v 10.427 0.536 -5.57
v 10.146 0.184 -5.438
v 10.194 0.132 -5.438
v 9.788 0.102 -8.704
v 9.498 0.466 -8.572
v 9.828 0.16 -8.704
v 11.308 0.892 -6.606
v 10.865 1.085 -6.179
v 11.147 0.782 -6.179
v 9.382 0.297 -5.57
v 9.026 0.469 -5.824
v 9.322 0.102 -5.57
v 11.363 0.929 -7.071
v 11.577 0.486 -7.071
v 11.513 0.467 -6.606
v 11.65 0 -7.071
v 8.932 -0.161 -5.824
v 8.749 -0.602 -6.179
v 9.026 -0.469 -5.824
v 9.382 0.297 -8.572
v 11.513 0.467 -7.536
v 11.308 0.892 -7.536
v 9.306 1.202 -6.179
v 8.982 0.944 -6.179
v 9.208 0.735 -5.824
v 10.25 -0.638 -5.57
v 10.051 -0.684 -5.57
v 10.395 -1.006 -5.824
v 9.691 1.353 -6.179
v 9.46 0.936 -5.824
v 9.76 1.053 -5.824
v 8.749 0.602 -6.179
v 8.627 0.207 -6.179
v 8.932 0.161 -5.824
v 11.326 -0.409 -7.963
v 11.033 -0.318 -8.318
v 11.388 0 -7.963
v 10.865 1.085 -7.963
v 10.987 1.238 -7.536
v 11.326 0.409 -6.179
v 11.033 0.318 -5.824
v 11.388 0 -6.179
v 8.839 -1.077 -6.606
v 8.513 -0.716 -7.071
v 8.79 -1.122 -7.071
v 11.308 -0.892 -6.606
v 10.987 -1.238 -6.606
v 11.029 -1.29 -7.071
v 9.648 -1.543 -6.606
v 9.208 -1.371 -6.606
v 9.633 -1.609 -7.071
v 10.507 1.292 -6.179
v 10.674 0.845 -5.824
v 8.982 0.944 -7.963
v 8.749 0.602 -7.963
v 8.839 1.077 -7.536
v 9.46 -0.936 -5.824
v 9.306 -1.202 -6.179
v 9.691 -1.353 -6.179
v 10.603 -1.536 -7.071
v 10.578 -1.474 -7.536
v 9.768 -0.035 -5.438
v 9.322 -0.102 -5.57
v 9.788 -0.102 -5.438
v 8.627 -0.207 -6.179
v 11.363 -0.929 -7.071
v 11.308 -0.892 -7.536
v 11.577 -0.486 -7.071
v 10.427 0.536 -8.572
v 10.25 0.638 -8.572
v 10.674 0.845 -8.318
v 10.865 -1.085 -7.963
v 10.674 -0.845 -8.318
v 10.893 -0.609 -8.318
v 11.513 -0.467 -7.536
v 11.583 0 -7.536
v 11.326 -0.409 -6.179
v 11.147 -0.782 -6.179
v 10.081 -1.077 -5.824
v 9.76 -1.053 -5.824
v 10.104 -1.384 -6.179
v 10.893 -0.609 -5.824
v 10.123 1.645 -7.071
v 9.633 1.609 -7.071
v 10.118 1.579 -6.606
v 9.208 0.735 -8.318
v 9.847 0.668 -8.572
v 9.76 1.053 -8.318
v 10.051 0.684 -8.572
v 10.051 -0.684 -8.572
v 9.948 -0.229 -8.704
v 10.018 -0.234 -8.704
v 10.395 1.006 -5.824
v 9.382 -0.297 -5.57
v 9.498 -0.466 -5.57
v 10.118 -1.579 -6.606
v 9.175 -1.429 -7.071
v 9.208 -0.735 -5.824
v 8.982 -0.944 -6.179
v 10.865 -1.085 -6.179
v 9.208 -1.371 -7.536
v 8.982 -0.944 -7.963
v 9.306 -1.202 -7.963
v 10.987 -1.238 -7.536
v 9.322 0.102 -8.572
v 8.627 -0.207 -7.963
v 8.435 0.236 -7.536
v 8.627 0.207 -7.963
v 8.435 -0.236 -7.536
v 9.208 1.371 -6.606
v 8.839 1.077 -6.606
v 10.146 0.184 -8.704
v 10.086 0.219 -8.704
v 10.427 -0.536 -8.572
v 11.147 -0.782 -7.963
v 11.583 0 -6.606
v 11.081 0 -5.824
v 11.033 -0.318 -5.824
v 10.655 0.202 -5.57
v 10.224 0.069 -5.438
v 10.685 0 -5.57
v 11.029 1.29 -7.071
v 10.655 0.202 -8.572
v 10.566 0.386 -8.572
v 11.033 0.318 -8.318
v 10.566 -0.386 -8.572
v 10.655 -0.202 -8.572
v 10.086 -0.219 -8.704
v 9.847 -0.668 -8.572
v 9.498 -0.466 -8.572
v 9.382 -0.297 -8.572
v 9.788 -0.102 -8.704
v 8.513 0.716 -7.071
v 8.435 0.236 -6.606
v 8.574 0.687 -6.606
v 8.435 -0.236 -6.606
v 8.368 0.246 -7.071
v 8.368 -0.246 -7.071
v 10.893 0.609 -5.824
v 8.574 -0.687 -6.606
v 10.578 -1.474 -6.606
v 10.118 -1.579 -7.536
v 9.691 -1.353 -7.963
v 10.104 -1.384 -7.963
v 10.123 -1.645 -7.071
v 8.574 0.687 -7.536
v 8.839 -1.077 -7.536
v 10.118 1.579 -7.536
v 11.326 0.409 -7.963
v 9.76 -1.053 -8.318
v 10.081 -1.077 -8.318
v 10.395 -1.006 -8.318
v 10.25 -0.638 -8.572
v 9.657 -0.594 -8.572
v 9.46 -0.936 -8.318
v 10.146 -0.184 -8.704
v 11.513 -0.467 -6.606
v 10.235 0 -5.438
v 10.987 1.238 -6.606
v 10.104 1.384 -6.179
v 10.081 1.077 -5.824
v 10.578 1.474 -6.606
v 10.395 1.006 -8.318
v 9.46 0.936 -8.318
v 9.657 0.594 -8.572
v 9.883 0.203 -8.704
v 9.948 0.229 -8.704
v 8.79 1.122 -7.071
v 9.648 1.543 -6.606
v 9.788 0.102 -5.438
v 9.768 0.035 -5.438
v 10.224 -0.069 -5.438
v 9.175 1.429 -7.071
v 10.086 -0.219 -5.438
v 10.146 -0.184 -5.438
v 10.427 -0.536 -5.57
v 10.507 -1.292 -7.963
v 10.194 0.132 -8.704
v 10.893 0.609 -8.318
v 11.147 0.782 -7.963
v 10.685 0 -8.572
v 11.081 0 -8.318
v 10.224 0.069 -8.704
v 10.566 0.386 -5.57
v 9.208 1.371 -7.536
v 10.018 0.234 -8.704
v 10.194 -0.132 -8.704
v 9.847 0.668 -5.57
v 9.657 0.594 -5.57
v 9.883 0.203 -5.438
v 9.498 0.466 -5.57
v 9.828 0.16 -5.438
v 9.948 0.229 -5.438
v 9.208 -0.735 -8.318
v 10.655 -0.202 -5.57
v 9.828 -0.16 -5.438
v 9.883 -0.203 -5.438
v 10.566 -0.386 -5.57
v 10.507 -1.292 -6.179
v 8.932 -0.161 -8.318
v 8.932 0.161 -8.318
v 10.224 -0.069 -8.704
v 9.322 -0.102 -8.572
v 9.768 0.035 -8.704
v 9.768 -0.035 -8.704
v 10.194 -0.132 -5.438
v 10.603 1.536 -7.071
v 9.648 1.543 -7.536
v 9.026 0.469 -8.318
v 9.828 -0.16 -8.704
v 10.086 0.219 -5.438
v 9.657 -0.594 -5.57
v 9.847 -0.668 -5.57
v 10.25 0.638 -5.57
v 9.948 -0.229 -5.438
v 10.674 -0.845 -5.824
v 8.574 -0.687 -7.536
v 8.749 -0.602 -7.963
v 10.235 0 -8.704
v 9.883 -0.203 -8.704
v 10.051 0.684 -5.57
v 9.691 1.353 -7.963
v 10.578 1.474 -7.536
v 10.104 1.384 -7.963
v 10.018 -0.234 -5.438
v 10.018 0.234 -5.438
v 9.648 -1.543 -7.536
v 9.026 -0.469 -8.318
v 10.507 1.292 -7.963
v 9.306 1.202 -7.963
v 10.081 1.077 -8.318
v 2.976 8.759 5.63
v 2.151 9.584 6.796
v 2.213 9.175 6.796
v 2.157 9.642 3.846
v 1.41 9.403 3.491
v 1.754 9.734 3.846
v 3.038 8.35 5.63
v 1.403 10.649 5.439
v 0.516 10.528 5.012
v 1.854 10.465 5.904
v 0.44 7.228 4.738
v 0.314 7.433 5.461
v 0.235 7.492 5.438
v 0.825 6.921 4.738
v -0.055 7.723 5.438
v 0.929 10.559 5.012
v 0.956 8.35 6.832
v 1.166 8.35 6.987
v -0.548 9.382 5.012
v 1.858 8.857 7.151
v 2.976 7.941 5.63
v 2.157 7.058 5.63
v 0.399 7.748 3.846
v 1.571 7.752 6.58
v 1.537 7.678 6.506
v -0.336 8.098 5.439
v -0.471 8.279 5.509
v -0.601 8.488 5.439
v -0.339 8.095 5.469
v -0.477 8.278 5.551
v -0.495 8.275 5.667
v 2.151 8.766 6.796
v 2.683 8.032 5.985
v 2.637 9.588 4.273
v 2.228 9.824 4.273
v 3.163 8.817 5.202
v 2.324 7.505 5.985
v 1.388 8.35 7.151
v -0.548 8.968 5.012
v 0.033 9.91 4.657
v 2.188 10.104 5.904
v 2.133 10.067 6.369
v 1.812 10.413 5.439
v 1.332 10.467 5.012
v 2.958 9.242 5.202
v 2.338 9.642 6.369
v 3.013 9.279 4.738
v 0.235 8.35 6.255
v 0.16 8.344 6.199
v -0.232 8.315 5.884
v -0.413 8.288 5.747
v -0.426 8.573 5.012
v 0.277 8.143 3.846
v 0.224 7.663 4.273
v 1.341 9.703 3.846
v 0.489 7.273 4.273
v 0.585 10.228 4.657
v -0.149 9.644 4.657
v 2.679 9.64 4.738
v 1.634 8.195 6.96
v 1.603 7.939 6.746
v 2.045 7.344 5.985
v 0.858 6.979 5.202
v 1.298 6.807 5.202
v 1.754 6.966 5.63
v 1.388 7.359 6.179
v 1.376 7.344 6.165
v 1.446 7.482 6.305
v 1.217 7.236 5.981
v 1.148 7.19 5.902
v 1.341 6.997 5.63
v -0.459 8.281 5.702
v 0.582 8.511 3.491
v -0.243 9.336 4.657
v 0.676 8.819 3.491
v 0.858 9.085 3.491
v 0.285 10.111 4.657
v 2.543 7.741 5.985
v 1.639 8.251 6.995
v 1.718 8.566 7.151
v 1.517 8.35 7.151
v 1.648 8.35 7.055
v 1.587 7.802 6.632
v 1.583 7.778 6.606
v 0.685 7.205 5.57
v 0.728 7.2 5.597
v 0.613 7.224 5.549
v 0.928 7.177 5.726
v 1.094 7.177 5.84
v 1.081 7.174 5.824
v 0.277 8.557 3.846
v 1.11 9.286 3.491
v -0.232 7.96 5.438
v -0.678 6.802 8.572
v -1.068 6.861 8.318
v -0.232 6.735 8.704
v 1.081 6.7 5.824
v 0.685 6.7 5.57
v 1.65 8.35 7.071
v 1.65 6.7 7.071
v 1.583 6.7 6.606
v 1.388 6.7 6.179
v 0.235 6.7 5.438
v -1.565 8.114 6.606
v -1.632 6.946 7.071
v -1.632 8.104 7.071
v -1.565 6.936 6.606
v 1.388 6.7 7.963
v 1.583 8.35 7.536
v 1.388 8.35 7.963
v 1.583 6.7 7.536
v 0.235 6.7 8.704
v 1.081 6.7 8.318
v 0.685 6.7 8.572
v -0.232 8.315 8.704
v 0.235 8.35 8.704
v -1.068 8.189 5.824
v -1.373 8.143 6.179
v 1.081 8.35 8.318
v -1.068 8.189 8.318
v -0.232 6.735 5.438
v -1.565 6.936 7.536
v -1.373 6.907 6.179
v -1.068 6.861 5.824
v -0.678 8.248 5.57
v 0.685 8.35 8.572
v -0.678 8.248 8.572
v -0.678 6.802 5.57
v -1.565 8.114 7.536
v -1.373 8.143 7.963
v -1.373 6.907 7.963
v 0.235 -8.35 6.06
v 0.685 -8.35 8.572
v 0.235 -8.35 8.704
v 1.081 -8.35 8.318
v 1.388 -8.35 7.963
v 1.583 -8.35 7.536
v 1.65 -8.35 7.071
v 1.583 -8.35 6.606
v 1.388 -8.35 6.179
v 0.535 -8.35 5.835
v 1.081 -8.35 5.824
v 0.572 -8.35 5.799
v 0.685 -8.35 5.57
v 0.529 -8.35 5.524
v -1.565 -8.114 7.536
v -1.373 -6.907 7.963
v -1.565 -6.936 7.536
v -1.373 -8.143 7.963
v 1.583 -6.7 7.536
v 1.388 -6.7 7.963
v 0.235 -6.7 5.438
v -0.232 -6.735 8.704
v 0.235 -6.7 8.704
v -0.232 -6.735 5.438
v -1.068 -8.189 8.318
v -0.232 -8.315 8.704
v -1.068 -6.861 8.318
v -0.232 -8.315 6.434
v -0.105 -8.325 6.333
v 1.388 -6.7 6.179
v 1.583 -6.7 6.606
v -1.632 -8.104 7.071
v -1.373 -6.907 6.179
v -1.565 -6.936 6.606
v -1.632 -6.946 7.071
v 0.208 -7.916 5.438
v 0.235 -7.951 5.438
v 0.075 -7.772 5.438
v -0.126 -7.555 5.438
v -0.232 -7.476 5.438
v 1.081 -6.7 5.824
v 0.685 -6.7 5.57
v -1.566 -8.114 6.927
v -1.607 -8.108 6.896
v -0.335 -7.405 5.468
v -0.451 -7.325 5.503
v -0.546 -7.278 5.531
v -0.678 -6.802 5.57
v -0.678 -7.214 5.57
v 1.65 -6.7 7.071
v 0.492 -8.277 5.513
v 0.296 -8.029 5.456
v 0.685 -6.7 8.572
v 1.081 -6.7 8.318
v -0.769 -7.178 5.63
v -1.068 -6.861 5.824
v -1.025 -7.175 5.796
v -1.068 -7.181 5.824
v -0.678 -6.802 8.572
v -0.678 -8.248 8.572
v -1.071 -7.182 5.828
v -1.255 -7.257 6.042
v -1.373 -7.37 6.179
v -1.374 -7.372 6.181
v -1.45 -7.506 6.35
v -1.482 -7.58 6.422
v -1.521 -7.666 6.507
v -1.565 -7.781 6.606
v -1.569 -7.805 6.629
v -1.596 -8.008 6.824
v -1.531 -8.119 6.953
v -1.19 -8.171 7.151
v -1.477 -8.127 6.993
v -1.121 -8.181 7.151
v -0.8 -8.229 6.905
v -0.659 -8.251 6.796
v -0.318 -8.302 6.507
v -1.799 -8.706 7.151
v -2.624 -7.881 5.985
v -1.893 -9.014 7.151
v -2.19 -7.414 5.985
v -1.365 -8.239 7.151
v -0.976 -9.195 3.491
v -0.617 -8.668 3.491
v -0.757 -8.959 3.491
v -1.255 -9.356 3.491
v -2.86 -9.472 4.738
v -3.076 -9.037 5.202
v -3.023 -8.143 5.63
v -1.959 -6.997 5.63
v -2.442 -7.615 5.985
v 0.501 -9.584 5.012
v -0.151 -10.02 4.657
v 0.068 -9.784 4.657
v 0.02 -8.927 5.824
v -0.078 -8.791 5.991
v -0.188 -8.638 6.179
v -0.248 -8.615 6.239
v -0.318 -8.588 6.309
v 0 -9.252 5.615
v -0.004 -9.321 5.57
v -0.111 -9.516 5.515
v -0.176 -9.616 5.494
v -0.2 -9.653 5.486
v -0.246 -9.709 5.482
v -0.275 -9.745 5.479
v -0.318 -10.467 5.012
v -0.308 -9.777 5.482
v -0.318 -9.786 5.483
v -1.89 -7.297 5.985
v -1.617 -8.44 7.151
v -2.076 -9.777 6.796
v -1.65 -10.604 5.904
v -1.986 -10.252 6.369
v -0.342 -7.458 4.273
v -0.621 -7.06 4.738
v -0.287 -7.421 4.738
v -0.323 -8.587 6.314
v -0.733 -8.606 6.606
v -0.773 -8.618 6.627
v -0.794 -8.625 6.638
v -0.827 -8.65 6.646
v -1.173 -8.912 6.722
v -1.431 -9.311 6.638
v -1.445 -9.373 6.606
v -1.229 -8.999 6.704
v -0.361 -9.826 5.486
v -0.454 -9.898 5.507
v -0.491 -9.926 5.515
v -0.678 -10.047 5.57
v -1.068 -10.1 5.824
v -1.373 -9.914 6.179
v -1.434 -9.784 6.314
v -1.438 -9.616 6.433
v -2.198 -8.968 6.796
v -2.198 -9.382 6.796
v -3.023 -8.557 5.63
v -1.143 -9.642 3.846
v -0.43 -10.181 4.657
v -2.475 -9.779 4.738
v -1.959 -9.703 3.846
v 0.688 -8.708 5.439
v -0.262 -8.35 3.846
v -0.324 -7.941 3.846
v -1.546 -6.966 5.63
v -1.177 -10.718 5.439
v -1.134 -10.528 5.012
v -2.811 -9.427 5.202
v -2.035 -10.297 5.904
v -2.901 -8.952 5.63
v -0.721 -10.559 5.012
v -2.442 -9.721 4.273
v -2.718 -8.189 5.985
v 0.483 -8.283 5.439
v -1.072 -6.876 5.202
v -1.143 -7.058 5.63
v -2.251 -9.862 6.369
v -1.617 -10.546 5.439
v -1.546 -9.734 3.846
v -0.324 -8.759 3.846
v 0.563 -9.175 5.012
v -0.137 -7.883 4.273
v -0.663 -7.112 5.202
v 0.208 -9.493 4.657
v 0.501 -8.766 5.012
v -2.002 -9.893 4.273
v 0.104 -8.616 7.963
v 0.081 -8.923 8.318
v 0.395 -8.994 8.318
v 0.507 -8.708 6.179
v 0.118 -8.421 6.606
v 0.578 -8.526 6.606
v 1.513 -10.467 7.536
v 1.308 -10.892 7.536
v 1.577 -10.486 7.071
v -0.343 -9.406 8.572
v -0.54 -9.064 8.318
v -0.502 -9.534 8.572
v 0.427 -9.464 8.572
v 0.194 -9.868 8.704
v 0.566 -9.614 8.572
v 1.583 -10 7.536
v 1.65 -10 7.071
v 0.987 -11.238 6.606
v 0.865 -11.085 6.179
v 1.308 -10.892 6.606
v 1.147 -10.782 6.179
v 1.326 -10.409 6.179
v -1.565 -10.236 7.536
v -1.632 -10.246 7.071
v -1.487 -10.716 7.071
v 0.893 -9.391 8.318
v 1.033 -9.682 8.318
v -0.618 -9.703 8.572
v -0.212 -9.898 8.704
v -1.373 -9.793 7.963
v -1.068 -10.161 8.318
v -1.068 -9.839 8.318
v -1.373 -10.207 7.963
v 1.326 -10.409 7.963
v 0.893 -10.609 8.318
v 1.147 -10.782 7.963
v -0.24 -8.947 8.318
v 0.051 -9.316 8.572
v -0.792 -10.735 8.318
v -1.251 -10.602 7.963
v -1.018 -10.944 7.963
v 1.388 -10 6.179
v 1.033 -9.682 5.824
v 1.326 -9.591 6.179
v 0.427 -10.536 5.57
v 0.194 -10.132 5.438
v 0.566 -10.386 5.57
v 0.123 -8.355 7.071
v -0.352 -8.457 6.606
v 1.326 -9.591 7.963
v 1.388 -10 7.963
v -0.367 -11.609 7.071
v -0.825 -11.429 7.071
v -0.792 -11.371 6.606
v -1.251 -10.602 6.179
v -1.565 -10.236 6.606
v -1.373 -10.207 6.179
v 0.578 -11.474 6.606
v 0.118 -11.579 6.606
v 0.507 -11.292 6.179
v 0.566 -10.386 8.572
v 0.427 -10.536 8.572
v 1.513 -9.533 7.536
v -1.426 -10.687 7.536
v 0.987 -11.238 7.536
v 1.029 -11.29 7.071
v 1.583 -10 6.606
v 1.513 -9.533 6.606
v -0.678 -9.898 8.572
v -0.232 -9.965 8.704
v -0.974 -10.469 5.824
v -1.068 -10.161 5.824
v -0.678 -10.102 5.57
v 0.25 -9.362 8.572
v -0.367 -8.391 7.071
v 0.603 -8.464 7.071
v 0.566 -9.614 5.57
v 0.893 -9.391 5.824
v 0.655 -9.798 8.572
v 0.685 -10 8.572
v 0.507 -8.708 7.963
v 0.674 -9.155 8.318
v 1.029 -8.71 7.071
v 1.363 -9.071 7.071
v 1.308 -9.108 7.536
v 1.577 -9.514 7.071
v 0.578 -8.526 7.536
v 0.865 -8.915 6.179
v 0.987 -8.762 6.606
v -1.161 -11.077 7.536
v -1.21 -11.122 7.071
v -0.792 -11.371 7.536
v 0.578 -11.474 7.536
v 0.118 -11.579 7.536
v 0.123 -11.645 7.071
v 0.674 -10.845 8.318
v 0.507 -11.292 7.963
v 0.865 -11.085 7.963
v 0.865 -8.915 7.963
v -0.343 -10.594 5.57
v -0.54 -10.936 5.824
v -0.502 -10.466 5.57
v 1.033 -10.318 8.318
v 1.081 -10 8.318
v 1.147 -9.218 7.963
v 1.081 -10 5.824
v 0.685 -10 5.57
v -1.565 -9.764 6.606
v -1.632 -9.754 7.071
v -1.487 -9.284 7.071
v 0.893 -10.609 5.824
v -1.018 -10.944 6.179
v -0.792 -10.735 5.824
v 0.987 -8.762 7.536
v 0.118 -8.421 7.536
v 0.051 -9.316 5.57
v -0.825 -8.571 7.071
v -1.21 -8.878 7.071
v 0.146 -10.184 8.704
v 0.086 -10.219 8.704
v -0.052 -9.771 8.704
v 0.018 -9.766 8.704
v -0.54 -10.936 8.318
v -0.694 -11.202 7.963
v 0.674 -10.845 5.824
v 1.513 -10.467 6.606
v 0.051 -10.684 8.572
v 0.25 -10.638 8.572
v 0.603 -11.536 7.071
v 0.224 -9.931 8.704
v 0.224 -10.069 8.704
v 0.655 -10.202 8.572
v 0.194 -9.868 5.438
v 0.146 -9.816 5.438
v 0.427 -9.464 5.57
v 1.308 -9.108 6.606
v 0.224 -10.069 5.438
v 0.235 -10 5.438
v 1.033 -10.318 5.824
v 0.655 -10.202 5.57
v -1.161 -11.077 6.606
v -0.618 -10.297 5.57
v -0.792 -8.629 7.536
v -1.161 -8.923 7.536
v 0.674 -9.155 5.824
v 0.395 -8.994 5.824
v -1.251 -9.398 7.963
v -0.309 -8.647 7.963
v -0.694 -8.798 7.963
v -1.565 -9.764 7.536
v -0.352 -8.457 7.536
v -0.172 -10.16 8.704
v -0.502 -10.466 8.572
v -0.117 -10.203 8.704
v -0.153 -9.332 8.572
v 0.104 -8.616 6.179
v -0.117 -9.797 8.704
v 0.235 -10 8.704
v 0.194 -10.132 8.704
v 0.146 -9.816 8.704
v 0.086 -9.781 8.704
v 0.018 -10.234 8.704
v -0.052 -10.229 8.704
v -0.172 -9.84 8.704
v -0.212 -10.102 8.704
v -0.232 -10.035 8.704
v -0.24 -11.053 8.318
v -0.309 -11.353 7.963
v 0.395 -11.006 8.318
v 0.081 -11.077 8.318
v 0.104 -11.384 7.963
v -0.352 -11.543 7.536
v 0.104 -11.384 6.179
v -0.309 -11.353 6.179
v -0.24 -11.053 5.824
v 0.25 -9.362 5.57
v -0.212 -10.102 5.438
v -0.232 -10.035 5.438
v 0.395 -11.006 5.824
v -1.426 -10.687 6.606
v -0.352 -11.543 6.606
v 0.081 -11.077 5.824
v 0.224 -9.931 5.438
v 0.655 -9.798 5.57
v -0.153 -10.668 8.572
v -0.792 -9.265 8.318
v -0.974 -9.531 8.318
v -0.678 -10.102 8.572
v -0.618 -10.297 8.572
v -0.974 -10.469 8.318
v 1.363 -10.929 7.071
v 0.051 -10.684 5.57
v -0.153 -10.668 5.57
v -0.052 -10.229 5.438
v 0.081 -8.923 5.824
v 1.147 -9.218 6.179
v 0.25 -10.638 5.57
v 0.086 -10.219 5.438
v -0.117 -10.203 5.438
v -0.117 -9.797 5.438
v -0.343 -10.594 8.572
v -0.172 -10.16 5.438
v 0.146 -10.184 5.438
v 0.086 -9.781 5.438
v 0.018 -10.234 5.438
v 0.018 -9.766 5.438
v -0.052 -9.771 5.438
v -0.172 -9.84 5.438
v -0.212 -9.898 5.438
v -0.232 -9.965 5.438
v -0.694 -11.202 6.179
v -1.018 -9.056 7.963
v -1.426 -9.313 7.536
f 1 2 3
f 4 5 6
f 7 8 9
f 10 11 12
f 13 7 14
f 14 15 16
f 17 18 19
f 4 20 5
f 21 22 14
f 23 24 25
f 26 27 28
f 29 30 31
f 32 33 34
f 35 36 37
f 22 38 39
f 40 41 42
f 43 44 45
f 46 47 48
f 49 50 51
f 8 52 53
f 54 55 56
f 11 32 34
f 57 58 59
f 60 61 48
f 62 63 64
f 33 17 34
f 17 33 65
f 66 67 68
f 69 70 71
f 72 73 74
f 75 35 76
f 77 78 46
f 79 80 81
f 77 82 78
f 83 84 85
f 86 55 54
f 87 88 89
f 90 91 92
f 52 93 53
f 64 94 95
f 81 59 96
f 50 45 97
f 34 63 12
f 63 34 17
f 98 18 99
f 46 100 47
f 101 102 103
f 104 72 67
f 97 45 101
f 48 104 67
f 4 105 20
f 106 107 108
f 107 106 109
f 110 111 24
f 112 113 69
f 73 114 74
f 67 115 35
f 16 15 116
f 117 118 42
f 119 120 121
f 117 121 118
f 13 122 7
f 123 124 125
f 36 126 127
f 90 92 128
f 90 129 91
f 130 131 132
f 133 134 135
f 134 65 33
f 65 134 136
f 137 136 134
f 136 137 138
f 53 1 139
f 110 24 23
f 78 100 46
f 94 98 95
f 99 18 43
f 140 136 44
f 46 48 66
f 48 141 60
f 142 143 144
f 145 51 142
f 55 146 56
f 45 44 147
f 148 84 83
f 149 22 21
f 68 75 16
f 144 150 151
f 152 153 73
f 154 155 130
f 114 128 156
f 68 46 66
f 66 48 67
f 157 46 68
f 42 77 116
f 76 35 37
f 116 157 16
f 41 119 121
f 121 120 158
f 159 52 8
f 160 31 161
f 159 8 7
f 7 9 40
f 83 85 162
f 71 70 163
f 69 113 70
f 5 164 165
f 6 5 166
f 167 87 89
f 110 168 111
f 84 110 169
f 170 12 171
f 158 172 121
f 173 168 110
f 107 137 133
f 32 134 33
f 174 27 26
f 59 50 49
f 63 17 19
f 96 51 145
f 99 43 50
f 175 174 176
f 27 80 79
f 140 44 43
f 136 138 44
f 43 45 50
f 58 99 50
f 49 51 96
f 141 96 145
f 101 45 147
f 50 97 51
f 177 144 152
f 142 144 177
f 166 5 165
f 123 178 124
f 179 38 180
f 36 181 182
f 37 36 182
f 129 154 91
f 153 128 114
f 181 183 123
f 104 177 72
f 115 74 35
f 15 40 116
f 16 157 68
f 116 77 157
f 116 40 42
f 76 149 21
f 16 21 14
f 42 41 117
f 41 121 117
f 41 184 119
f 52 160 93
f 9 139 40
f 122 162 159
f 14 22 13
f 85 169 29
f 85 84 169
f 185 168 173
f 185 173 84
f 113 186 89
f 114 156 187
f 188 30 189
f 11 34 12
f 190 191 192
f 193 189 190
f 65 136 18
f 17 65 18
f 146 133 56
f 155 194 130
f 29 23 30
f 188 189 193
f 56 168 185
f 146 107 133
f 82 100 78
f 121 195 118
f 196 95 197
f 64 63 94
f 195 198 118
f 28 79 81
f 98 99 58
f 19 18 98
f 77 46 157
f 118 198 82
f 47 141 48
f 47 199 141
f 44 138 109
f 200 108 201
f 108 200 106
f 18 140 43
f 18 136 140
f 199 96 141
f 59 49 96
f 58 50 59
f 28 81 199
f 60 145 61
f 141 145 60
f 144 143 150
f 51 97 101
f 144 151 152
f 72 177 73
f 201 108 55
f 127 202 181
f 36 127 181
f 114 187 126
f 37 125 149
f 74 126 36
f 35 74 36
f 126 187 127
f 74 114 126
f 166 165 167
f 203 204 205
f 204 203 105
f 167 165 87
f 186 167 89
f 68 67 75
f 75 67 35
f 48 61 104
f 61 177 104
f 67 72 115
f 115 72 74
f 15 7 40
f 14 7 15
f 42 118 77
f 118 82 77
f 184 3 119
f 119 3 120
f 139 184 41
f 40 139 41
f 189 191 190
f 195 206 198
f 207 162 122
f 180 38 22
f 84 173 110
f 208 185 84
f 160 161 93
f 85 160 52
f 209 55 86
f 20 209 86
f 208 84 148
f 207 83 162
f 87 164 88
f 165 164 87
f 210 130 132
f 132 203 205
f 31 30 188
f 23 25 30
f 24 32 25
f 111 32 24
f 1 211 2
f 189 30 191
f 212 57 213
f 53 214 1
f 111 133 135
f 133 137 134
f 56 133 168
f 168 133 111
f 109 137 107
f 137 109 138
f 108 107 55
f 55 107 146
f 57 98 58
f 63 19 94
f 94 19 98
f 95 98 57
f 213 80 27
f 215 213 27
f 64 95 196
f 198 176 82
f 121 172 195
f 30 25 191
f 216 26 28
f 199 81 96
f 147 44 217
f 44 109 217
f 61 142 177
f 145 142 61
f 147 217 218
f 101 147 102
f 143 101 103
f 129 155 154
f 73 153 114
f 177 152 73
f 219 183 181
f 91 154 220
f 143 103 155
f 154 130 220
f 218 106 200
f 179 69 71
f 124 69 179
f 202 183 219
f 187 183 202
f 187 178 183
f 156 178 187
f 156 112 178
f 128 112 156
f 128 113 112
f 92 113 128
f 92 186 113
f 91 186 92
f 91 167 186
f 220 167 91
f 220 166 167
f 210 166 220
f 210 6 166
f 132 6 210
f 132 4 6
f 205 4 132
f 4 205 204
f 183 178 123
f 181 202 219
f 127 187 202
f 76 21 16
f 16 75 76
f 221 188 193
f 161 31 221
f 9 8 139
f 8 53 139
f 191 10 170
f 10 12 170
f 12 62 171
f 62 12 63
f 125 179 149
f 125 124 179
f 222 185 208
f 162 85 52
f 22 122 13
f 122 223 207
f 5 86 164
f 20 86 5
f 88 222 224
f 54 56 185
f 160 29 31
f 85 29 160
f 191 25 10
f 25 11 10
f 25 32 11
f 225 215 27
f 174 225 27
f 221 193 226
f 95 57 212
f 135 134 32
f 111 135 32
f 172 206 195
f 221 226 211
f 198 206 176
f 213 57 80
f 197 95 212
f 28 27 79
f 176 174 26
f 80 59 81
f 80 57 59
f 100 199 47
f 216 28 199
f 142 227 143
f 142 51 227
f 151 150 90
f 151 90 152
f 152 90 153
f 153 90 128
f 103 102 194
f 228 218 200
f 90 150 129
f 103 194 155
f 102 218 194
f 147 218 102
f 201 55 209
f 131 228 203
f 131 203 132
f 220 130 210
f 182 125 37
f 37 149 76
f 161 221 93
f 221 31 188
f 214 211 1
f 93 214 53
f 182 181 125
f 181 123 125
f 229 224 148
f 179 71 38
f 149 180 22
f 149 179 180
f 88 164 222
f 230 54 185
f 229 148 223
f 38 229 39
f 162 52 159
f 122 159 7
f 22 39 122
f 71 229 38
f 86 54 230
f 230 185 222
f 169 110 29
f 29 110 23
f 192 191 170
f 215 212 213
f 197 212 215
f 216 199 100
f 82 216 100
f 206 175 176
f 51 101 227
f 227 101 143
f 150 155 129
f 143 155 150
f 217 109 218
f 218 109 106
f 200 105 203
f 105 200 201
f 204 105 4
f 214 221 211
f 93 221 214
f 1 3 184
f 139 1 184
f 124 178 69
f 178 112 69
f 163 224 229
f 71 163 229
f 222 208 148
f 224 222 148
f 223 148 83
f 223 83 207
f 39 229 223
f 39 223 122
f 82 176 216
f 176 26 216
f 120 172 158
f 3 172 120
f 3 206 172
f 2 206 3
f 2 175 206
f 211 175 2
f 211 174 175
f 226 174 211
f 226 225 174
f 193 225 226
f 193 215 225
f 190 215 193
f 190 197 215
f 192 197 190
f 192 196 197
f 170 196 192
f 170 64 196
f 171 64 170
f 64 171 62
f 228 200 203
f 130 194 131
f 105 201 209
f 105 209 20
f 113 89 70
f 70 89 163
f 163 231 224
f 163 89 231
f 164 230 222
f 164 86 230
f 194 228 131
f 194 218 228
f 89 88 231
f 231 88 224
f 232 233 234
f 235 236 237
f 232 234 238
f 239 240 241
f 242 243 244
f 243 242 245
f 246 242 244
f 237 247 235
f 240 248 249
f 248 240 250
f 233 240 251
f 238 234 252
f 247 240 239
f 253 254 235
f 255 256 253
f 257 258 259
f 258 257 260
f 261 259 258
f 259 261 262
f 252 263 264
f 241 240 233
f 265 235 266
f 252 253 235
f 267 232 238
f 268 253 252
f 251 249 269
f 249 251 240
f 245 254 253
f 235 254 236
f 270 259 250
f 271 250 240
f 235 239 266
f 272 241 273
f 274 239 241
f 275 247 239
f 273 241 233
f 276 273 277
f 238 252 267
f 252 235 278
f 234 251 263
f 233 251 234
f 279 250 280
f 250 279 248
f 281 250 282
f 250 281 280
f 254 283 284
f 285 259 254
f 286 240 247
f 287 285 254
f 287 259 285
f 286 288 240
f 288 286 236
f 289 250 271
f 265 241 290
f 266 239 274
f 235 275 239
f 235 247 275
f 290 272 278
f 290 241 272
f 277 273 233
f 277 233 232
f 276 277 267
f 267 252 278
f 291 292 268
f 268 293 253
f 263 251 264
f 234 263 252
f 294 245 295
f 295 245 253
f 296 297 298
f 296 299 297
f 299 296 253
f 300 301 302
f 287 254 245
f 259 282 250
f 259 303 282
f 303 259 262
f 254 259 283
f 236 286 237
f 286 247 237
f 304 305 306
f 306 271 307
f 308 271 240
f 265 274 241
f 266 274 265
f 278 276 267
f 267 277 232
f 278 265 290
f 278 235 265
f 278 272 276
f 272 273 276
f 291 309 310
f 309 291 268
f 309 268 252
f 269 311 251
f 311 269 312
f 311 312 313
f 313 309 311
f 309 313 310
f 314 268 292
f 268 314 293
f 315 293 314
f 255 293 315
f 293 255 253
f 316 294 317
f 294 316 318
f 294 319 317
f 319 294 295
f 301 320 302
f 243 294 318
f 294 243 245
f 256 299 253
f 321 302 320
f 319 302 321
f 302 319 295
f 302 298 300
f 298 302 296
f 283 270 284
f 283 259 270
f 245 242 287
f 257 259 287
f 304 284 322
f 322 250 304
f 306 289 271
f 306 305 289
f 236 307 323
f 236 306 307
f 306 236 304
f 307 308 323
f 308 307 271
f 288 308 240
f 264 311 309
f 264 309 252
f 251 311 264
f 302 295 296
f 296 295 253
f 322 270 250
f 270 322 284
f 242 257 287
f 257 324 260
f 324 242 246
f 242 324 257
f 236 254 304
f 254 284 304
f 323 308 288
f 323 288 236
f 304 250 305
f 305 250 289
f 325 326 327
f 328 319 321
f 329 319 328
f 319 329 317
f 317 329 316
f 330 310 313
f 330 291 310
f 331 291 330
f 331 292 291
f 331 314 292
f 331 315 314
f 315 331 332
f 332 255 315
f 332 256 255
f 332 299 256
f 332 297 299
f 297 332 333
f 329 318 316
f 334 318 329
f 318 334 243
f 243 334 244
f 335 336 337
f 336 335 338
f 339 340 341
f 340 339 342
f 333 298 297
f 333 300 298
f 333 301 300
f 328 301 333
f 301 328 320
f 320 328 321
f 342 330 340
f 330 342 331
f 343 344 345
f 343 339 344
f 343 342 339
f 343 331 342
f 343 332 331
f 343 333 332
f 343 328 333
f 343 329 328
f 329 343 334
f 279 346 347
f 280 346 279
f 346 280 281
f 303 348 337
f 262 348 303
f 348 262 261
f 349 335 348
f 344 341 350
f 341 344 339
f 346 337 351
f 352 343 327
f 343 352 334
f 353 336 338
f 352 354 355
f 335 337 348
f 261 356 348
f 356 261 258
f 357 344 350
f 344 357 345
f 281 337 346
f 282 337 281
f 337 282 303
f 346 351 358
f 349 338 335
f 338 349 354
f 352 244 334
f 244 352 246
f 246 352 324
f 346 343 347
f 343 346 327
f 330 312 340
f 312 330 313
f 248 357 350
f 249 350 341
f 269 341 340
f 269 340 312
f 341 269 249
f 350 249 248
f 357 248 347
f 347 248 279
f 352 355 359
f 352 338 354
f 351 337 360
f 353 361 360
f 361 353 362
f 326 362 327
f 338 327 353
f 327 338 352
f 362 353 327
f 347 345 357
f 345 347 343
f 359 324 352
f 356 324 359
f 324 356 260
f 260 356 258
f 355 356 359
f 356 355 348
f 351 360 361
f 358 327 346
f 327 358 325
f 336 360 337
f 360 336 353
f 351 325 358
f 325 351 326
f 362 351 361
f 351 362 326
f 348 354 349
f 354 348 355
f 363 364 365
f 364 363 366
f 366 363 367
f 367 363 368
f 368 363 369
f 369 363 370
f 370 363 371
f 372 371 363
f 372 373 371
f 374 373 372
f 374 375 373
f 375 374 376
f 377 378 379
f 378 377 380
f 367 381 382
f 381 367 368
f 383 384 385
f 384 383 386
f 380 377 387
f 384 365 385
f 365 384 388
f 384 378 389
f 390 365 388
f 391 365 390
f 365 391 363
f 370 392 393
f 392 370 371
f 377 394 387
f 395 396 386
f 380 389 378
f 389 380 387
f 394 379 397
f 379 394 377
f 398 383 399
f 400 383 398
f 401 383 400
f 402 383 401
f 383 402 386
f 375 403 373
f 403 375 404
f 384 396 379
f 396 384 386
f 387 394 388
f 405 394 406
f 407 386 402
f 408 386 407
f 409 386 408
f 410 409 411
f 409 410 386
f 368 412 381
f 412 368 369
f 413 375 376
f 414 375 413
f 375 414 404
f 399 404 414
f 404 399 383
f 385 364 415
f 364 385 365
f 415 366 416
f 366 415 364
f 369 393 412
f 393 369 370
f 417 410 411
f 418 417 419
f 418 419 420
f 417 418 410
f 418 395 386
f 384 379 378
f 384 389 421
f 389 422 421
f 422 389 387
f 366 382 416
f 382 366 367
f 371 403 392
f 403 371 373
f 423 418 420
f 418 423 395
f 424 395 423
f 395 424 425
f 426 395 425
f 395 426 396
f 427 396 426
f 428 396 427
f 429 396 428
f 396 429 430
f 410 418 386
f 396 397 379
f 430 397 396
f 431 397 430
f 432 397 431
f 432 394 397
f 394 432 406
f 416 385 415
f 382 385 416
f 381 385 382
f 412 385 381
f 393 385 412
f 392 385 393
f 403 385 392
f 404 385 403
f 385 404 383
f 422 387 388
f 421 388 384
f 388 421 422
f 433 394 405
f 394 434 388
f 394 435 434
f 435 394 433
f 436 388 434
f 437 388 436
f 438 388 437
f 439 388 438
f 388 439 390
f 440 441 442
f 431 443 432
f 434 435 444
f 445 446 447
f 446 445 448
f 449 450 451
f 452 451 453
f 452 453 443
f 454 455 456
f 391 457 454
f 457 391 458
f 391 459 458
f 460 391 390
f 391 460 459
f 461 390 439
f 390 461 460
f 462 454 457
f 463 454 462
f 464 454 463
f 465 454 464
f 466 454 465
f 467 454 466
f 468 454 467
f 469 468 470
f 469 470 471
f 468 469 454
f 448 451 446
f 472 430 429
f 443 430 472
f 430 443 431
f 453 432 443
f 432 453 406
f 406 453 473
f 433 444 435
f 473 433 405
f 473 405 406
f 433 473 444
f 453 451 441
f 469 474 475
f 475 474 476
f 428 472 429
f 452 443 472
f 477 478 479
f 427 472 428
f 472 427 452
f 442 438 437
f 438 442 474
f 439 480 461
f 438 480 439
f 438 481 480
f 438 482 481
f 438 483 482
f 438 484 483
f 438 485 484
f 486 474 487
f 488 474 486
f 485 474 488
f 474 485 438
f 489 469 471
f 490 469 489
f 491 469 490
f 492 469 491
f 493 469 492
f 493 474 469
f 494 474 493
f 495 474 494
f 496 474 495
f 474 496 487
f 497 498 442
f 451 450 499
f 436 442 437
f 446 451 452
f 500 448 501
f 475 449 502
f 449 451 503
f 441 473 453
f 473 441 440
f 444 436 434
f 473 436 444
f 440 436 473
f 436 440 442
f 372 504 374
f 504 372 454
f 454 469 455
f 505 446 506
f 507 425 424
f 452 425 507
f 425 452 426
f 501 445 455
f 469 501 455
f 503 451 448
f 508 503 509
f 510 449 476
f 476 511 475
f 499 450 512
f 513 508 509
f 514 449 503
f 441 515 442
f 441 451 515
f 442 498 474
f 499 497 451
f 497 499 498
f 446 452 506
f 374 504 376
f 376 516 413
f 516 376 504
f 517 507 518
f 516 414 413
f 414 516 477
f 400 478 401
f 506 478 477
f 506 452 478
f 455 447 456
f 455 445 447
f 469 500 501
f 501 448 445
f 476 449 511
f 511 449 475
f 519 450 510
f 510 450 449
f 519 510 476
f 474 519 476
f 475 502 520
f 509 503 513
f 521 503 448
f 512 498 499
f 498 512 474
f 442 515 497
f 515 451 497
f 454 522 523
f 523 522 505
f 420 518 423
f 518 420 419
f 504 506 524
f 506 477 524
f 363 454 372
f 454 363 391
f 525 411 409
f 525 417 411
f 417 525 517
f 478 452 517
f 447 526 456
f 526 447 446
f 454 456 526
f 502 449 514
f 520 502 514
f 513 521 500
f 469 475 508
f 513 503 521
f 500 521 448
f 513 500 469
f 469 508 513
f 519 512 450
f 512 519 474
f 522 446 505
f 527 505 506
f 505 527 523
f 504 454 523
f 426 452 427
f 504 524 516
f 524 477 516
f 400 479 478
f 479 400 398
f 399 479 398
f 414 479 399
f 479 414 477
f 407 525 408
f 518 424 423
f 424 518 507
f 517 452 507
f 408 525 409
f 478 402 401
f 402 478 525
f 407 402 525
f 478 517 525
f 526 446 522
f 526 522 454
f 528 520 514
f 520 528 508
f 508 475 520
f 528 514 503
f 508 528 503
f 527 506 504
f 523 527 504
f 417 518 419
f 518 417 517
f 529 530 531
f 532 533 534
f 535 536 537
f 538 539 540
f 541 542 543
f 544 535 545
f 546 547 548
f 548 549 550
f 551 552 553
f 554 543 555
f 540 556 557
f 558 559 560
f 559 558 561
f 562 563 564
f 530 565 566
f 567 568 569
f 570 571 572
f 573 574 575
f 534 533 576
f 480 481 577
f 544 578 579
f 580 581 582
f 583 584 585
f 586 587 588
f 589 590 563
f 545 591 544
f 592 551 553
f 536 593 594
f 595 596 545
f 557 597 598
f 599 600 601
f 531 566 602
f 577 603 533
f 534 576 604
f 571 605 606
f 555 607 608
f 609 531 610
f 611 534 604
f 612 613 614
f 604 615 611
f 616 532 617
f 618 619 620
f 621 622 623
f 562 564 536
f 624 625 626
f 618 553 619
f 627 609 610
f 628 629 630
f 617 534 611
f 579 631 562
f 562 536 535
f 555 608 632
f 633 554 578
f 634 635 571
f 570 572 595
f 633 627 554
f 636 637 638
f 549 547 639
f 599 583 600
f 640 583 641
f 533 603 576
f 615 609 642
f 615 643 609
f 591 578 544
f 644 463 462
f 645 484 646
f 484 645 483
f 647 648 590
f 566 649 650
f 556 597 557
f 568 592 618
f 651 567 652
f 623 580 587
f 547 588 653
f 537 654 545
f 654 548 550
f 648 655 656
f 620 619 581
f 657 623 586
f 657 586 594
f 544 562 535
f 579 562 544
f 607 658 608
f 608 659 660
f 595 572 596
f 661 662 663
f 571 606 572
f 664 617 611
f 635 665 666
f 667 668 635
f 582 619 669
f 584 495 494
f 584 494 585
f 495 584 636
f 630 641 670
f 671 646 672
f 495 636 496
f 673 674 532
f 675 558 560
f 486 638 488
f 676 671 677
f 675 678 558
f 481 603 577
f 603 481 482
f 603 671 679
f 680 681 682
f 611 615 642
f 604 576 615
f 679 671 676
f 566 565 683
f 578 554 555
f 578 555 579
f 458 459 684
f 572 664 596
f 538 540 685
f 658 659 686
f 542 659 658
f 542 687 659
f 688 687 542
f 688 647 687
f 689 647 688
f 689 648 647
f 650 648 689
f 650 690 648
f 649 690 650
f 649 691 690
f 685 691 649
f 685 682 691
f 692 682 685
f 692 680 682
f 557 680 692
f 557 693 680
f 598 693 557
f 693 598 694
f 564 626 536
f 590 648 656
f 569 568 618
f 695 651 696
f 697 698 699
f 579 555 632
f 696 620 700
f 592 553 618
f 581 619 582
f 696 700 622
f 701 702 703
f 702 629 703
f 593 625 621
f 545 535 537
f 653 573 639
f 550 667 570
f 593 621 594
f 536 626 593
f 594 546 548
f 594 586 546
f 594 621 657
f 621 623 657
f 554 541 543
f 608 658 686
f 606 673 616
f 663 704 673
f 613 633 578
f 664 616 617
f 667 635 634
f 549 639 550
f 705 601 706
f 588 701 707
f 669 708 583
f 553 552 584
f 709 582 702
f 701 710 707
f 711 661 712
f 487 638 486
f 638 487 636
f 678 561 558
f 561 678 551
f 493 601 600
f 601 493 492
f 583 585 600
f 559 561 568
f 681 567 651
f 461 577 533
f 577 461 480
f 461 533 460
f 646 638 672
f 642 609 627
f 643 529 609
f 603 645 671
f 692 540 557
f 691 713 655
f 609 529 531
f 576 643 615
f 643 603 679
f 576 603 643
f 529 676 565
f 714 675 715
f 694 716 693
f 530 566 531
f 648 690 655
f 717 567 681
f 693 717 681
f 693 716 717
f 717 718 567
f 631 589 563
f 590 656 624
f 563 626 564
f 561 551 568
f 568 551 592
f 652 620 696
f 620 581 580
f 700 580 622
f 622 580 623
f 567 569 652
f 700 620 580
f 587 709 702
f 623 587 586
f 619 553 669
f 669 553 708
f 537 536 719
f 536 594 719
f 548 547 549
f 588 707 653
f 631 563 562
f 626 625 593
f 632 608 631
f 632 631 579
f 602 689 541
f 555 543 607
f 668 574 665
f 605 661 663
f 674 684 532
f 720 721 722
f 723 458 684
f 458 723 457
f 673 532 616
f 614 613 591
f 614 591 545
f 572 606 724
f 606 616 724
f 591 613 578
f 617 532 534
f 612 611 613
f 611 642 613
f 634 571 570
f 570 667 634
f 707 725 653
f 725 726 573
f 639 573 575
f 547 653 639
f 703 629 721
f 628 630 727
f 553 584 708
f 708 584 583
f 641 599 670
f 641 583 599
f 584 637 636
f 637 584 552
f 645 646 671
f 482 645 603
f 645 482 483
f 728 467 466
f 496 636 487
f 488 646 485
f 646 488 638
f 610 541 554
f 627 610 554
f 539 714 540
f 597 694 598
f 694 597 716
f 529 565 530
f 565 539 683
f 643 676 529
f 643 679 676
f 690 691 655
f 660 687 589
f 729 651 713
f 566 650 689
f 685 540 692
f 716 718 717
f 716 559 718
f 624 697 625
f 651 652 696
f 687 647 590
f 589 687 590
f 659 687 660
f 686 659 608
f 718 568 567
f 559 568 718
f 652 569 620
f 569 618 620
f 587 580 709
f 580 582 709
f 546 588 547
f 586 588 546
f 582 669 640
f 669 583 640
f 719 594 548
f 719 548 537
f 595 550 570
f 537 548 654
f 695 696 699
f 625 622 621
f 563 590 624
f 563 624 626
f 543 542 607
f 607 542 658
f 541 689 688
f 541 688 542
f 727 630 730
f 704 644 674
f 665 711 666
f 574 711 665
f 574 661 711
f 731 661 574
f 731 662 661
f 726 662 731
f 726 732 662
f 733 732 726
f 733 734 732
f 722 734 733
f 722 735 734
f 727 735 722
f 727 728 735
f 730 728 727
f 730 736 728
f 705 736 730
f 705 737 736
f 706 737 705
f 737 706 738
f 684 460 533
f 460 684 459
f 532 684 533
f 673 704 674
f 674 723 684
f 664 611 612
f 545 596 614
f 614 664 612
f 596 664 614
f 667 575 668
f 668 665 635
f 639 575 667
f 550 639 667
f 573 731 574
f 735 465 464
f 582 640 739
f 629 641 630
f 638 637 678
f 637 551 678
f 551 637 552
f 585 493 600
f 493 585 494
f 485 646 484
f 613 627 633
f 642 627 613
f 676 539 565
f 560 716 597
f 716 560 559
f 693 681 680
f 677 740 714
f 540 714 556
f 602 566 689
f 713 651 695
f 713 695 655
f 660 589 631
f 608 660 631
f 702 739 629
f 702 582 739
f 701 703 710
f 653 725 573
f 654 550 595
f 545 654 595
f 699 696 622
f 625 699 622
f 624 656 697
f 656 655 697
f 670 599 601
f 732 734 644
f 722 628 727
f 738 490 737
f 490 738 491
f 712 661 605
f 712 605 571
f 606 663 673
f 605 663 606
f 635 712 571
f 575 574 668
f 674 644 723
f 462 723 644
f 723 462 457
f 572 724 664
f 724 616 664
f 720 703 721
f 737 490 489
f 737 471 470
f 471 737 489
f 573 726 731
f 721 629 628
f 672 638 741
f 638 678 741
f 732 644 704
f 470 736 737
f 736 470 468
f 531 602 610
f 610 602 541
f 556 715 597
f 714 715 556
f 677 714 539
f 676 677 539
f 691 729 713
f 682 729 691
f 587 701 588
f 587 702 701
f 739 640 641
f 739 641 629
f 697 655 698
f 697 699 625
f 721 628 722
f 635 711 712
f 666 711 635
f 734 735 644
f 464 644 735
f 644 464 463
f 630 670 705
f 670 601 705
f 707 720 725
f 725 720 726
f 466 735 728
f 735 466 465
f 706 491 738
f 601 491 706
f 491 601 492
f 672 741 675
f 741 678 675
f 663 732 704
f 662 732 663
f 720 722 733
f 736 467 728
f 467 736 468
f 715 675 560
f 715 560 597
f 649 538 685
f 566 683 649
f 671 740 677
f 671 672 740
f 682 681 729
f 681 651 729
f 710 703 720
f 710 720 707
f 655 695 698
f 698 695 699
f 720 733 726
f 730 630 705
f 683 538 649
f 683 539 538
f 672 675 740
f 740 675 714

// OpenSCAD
// Generated by SolidPython 0.4.6 on 2020-02-10 21:00:04
$fa = .01;
$fs = 0.05;


color(c = "red") {
	scale(v = [10.0000000000, 10.0000000000, 10.0000000000]) {
		union() {
			translate(v = [1.0000000000, 0.0000000000, -0.7071067812]) {
				sphere(r = 0.1650000000);
			}
			hull() {
				difference() {
					hull() {
						translate(v = [0.0825000000, 0.9175000000, 0.5904341623]) {
							sphere(r = 0.1650000000);
						}
						translate(v = [0.1650000000, 0.8350000000, 0.4737615434]) {
							sphere(r = 0.1650000000);
						}
					}
					translate(v = [0.0825000000, 0.9175000000, 0.5904341623]) {
						sphere(r = 0.1650000000);
					}
					translate(v = [0.1650000000, 0.8350000000, 0.4737615434]) {
						sphere(r = 0.1650000000);
					}
				}
			}
			hull() {
				difference() {
					hull() {
						translate(v = [0.0000000000, 0.8350000000, 0.7071067812]) {
							sphere(r = 0.1650000000);
						}
						translate(v = [0.0000000000, 0.6700000000, 0.7071067812]) {
							sphere(r = 0.1650000000);
						}
					}
					translate(v = [0.0000000000, 0.8350000000, 0.7071067812]) {
						sphere(r = 0.1650000000);
					}
					translate(v = [0.0000000000, 0.6700000000, 0.7071067812]) {
						sphere(r = 0.1650000000);
					}
				}
			}
			hull() {
				difference() {
					hull() {
						translate(v = [0.0000000000, -0.8350000000, 0.7071067812]) {
							sphere(r = 0.1650000000);
						}
						translate(v = [0.0000000000, -0.6700000000, 0.7071067812]) {
							sphere(r = 0.1650000000);
						}
					}
					translate(v = [0.0000000000, -0.8350000000, 0.7071067812]) {
						sphere(r = 0.1650000000);
					}
					translate(v = [0.0000000000, -0.6700000000, 0.7071067812]) {
						sphere(r = 0.1650000000);
					}
				}
			}
			hull() {
				difference() {
					hull() {
						translate(v = [-0.0825000000, -0.9175000000, 0.5904341623]) {
							sphere(r = 0.1650000000);
						}
						translate(v = [-0.1650000000, -0.8350000000, 0.4737615434]) {
							sphere(r = 0.1650000000);
						}
					}
					translate(v = [-0.0825000000, -0.9175000000, 0.5904341623]) {
						sphere(r = 0.1650000000);
					}
					translate(v = [-0.1650000000, -0.8350000000, 0.4737615434]) {
						sphere(r = 0.1650000000);
					}
				}
			}
			translate(v = [0.0000000000, -1.0000000000, 0.7071067812]) {
				sphere(r = 0.1650000000);
			}
		}
	}
}
/***********************************************
*********      SolidPython code:      **********
************************************************
 
from solid import *
from solid.utils import *

from rocky_common import *


a0 = (1.0, 0.0, -sqrt(.5))
a1 = (0.0, 1.0, sqrt(.5))
b0 = (-1.0, 0.0, -sqrt(.5))
b1 = (0.0, -1.0, sqrt(.5))


def d4_twist():
    out = []
    thickness = 3
    size = 20
    minscale = .05
    for i in range(int(1 / minscale) + 1):
        i = i / int(1 / minscale)
        out.append(line(mix(a0, a1, i), mix(b0, b1, i), thickness / size))

    body = scale((size / 2,) * 3)(pairwise_hull(out))
    pip_r = 1.1 * thickness / size
    pip_sphere = sphere(r=pip_r)

    def pip_line(a, b):
        return line(mix(a, b, .5 * pip_r), mix(a, b, 1.0 * pip_r), r=pip_r, capped=False)

    pips = color('red')(scale((size / 2,) * 3)(
        translate(a0)(pip_sphere)
        + pip_line(a1, a0)
        + pip_line(a1, b1)
        + pip_line(b1, a1)
        + pip_line(b1, b0)
        + translate(b1)(pip_sphere)
    ))

    out = (body - pips) + pips

    scad_render_to_file(body + pips, 'd4_twist.scad', file_header=f'$fa = .01;\n$fs = {minscale};\n')
    scad_render_to_file(body - pips, 'd4_twist_body.scad', file_header=f'$fa = .01;\n$fs = {minscale};\n')
    scad_render_to_file(pips, 'd4_twist_pips.scad', file_header=f'$fa = .01;\n$fs = {minscale};\n')


if __name__ == '__main__':
    d4_twist()
 
 
************************************************/
